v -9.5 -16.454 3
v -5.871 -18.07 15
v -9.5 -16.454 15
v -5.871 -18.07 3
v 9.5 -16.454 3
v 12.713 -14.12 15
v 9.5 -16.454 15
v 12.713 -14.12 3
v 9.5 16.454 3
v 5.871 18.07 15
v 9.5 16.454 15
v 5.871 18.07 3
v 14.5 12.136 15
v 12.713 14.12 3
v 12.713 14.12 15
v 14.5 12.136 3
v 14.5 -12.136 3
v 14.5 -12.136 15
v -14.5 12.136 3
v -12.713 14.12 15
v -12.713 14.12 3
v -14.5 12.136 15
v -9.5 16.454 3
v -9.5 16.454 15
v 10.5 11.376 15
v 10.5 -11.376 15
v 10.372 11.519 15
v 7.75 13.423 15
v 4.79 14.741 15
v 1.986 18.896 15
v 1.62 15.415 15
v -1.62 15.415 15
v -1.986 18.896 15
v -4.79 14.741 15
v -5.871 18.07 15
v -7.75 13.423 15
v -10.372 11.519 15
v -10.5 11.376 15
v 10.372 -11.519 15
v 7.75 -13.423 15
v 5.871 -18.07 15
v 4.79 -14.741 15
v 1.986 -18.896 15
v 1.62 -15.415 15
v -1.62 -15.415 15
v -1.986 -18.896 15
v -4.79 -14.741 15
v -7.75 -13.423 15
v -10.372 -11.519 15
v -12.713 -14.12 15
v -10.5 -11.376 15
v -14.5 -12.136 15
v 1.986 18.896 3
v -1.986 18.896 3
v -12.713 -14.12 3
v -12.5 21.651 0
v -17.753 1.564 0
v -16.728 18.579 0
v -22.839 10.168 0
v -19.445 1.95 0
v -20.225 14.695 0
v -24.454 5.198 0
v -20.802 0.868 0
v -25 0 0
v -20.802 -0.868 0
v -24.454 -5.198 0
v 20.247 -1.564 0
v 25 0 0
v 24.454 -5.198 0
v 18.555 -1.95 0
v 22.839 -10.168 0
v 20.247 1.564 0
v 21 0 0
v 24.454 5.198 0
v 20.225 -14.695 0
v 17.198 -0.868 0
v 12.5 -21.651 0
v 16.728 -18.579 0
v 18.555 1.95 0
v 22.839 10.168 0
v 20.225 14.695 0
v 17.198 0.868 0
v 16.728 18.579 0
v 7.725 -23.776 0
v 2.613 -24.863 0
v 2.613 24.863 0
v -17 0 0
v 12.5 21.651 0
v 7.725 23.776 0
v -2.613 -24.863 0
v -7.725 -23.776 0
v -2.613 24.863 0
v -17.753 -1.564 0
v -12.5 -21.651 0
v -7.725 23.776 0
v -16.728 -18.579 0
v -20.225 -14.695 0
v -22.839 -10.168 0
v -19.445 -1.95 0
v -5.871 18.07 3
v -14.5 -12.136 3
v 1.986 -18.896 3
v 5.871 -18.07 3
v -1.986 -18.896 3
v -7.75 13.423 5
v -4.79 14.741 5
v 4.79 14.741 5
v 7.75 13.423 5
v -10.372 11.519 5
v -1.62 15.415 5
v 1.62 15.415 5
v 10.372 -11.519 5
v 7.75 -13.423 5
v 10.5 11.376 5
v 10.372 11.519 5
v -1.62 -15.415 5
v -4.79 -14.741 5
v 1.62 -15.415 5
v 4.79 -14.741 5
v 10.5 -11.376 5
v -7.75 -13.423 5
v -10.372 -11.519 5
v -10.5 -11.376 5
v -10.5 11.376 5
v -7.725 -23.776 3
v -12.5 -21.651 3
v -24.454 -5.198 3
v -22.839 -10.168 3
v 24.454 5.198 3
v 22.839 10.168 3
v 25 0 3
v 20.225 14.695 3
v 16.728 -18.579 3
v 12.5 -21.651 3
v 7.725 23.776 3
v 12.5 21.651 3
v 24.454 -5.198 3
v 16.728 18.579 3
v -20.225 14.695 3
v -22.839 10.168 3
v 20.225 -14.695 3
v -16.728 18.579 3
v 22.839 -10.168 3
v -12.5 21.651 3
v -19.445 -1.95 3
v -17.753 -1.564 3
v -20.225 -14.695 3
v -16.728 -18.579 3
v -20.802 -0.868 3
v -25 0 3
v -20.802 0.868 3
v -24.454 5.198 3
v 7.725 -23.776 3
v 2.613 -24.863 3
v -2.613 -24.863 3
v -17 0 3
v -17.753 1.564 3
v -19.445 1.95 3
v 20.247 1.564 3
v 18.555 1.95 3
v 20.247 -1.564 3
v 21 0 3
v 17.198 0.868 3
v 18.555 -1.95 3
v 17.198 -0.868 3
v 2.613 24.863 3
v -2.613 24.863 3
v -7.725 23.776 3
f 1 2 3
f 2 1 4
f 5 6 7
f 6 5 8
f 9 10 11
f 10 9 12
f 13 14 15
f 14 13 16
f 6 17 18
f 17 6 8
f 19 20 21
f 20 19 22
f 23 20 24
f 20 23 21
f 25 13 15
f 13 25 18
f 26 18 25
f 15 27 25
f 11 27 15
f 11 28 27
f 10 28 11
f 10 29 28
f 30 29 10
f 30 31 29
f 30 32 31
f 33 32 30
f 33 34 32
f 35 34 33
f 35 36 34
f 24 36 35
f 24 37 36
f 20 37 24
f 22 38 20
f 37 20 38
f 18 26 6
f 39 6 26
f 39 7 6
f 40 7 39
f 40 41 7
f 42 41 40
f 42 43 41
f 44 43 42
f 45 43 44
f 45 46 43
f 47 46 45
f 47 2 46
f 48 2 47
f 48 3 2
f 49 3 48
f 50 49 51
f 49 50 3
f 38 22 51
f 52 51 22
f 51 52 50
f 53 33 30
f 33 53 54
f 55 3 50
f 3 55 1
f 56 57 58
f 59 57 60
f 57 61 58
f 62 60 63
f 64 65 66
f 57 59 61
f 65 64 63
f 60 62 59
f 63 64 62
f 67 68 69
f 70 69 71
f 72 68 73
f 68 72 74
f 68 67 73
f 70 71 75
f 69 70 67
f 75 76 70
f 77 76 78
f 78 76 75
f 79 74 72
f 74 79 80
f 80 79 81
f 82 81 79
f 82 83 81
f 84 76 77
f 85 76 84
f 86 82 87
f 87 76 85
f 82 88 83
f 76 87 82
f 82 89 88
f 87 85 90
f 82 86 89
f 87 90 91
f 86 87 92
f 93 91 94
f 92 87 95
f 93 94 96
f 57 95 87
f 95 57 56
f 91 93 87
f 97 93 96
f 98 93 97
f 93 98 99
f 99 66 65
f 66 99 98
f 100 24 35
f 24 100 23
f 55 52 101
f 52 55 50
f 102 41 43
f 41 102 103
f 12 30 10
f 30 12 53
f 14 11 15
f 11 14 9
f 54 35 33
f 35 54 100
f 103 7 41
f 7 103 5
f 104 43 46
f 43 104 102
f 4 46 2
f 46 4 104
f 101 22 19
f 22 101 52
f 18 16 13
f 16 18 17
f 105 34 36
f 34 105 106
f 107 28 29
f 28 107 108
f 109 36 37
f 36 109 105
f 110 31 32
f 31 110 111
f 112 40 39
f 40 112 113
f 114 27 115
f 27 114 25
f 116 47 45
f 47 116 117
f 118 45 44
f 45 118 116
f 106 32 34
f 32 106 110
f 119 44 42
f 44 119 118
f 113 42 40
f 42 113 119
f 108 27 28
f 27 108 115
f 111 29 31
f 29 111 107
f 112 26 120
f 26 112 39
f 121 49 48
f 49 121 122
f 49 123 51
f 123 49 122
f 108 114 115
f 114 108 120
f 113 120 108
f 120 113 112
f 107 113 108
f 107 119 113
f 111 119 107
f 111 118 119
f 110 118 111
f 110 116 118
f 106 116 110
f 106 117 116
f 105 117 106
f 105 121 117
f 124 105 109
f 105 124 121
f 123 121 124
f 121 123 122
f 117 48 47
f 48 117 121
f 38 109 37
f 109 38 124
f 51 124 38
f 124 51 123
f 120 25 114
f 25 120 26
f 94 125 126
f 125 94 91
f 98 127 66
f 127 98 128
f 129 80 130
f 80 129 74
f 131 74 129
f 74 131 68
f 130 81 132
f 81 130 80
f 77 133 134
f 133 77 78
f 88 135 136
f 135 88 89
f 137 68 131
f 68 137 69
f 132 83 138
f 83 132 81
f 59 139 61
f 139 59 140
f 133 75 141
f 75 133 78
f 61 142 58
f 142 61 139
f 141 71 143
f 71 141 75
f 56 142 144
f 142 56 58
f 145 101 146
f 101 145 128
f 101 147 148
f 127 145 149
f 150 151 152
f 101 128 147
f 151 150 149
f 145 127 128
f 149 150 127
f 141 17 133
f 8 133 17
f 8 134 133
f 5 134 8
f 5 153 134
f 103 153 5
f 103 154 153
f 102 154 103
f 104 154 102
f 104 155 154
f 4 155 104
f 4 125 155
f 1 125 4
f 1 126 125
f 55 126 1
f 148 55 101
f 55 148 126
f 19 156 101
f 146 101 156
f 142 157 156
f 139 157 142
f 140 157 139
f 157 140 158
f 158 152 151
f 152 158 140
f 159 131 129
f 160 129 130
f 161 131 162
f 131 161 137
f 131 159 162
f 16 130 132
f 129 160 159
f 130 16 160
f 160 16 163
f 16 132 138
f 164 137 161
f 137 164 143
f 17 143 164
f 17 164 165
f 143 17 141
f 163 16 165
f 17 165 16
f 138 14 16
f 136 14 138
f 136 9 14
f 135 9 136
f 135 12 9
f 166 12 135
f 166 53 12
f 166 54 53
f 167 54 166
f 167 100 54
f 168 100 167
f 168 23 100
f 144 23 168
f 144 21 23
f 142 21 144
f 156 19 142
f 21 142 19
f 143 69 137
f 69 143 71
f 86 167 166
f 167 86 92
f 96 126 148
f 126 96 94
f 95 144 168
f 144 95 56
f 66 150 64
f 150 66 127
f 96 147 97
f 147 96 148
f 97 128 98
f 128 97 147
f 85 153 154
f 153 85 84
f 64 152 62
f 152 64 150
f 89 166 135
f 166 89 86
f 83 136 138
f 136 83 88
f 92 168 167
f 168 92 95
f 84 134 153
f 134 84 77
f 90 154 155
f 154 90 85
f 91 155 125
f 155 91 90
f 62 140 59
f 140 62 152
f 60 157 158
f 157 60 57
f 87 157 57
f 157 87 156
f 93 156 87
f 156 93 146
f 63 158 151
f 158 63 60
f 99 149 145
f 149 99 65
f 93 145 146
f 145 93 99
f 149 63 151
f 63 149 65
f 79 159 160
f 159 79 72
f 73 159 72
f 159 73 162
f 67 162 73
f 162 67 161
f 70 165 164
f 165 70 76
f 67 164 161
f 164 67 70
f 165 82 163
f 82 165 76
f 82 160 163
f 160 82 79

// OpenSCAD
/*
 *
 * 3D-printable hanger rail wall bracket to suit SpacePro Relax wardrobe interior fittings
 * As per https://spacepro.co.uk/portfolio/relax-hanger-bar/
 *
 */
difference () {
   difference () {
       cylinder( r=19, h=15 );
       translate( [-34.5,0.0] ) cube( size=40, center=true );
       translate( [34.5,0.0] ) cube( size=40, center=true );
   }
   difference () {
       translate( [0,0,5] ) cylinder( r=15.5, h=20 );
       translate( [-30.5,0,0] ) cube( size=40, center=true );
       translate( [30.5,0,0] ) cube( size=40, center=true );
   }
}
difference () {
    cylinder( r=25, h=3 );
    translate( [-19,0,-5] ) cylinder( r=2, h=10 );
    translate( [19,0,-5] ) cylinder( r=2, h=10 );
}
